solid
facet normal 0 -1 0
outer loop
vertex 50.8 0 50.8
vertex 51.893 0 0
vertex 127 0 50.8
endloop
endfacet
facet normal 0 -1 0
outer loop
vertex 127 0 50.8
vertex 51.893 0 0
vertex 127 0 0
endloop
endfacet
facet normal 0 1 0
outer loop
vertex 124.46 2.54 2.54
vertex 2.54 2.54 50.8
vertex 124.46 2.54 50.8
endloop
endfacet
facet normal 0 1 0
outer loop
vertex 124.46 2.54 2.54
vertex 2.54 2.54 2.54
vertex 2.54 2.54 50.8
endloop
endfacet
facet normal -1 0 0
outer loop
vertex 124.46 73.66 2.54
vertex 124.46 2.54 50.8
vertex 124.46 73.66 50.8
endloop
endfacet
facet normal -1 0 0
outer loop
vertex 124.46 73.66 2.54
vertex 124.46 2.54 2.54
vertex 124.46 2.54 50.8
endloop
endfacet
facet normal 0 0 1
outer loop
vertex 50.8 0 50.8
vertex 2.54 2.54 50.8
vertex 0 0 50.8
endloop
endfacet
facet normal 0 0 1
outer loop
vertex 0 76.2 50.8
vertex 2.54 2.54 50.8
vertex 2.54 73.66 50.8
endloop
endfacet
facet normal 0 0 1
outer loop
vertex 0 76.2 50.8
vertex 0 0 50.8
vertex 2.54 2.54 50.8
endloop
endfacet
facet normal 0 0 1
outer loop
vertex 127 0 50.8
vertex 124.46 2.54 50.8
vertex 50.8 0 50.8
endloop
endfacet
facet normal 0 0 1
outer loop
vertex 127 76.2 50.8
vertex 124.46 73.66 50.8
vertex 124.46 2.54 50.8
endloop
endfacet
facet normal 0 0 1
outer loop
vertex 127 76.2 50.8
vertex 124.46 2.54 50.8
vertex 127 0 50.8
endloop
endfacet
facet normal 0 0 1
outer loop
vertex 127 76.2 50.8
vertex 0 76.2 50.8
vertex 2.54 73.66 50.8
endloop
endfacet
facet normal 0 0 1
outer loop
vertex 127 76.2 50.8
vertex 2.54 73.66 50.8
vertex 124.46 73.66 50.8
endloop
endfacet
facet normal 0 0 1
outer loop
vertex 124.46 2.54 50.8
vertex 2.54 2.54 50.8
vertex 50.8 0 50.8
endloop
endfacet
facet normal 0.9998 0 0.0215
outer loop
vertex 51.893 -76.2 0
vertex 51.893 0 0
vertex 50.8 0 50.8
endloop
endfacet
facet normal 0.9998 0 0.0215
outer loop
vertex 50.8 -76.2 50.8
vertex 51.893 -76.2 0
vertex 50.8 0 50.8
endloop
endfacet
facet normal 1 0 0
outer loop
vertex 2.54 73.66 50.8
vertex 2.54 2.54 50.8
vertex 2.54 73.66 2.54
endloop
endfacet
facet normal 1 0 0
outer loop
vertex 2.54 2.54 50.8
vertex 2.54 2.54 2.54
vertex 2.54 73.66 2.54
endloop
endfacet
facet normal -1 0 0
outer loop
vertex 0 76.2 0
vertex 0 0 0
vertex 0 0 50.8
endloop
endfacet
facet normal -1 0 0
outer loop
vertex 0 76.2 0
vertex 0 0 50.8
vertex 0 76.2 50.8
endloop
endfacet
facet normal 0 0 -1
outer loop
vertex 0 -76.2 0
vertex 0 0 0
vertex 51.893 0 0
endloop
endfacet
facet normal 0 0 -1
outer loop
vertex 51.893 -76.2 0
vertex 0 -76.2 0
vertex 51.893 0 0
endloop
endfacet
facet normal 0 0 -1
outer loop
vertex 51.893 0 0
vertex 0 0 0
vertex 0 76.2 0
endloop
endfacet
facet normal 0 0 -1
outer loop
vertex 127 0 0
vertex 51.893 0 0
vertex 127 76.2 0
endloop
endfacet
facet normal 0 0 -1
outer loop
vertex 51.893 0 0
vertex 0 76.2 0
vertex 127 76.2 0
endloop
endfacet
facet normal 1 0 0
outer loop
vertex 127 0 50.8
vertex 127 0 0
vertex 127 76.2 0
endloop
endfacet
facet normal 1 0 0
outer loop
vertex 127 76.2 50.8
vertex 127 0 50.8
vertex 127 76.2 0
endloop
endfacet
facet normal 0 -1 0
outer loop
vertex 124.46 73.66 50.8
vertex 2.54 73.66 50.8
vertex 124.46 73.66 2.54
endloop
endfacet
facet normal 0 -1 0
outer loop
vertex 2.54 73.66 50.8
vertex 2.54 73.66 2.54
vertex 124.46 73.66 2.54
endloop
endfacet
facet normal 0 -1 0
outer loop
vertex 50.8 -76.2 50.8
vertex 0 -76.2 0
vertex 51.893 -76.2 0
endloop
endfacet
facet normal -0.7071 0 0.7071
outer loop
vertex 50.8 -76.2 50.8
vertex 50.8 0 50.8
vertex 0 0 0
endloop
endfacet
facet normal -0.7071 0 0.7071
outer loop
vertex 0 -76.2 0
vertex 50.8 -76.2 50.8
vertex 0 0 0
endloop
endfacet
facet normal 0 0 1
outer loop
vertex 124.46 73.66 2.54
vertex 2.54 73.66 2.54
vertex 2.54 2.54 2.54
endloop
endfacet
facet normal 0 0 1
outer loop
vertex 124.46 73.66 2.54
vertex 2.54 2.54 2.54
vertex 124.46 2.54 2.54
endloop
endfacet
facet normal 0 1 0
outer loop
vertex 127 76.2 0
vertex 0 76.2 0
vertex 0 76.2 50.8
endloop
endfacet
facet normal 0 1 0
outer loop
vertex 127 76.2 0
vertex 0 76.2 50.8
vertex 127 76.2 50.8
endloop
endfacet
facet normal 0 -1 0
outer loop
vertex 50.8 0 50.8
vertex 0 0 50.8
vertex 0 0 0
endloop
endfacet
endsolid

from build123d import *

# Parameters (mm, degrees)
F0_W     = 127
F0_H     = 76.2
F1_DEPTH = 50.8
F2_T     = -2.54
F4_DEPTH = 76.2


with BuildPart() as f1:
    # F0 (on Top) → F1 (new body)
    with BuildSketch(Plane.XY):
        with Locations((63.5, 38.1)):
            Rectangle(F0_W, F0_H)
    extrude(amount=F1_DEPTH)

    # F2
    f2_openings = [f1.faces().sort_by_distance(p)[0] for p in [
        (63.5, 38.1, 50.8),
    ]]
    offset(amount=F2_T, openings=f2_openings)

    # F3 (on face) → F4 (join)
    with BuildSketch(Plane.XZ):
        Polygon((50.8, 50.8), (0, 0), (51.892955, 0), align=None)
    extrude(amount=F4_DEPTH)


solid = f1.part
